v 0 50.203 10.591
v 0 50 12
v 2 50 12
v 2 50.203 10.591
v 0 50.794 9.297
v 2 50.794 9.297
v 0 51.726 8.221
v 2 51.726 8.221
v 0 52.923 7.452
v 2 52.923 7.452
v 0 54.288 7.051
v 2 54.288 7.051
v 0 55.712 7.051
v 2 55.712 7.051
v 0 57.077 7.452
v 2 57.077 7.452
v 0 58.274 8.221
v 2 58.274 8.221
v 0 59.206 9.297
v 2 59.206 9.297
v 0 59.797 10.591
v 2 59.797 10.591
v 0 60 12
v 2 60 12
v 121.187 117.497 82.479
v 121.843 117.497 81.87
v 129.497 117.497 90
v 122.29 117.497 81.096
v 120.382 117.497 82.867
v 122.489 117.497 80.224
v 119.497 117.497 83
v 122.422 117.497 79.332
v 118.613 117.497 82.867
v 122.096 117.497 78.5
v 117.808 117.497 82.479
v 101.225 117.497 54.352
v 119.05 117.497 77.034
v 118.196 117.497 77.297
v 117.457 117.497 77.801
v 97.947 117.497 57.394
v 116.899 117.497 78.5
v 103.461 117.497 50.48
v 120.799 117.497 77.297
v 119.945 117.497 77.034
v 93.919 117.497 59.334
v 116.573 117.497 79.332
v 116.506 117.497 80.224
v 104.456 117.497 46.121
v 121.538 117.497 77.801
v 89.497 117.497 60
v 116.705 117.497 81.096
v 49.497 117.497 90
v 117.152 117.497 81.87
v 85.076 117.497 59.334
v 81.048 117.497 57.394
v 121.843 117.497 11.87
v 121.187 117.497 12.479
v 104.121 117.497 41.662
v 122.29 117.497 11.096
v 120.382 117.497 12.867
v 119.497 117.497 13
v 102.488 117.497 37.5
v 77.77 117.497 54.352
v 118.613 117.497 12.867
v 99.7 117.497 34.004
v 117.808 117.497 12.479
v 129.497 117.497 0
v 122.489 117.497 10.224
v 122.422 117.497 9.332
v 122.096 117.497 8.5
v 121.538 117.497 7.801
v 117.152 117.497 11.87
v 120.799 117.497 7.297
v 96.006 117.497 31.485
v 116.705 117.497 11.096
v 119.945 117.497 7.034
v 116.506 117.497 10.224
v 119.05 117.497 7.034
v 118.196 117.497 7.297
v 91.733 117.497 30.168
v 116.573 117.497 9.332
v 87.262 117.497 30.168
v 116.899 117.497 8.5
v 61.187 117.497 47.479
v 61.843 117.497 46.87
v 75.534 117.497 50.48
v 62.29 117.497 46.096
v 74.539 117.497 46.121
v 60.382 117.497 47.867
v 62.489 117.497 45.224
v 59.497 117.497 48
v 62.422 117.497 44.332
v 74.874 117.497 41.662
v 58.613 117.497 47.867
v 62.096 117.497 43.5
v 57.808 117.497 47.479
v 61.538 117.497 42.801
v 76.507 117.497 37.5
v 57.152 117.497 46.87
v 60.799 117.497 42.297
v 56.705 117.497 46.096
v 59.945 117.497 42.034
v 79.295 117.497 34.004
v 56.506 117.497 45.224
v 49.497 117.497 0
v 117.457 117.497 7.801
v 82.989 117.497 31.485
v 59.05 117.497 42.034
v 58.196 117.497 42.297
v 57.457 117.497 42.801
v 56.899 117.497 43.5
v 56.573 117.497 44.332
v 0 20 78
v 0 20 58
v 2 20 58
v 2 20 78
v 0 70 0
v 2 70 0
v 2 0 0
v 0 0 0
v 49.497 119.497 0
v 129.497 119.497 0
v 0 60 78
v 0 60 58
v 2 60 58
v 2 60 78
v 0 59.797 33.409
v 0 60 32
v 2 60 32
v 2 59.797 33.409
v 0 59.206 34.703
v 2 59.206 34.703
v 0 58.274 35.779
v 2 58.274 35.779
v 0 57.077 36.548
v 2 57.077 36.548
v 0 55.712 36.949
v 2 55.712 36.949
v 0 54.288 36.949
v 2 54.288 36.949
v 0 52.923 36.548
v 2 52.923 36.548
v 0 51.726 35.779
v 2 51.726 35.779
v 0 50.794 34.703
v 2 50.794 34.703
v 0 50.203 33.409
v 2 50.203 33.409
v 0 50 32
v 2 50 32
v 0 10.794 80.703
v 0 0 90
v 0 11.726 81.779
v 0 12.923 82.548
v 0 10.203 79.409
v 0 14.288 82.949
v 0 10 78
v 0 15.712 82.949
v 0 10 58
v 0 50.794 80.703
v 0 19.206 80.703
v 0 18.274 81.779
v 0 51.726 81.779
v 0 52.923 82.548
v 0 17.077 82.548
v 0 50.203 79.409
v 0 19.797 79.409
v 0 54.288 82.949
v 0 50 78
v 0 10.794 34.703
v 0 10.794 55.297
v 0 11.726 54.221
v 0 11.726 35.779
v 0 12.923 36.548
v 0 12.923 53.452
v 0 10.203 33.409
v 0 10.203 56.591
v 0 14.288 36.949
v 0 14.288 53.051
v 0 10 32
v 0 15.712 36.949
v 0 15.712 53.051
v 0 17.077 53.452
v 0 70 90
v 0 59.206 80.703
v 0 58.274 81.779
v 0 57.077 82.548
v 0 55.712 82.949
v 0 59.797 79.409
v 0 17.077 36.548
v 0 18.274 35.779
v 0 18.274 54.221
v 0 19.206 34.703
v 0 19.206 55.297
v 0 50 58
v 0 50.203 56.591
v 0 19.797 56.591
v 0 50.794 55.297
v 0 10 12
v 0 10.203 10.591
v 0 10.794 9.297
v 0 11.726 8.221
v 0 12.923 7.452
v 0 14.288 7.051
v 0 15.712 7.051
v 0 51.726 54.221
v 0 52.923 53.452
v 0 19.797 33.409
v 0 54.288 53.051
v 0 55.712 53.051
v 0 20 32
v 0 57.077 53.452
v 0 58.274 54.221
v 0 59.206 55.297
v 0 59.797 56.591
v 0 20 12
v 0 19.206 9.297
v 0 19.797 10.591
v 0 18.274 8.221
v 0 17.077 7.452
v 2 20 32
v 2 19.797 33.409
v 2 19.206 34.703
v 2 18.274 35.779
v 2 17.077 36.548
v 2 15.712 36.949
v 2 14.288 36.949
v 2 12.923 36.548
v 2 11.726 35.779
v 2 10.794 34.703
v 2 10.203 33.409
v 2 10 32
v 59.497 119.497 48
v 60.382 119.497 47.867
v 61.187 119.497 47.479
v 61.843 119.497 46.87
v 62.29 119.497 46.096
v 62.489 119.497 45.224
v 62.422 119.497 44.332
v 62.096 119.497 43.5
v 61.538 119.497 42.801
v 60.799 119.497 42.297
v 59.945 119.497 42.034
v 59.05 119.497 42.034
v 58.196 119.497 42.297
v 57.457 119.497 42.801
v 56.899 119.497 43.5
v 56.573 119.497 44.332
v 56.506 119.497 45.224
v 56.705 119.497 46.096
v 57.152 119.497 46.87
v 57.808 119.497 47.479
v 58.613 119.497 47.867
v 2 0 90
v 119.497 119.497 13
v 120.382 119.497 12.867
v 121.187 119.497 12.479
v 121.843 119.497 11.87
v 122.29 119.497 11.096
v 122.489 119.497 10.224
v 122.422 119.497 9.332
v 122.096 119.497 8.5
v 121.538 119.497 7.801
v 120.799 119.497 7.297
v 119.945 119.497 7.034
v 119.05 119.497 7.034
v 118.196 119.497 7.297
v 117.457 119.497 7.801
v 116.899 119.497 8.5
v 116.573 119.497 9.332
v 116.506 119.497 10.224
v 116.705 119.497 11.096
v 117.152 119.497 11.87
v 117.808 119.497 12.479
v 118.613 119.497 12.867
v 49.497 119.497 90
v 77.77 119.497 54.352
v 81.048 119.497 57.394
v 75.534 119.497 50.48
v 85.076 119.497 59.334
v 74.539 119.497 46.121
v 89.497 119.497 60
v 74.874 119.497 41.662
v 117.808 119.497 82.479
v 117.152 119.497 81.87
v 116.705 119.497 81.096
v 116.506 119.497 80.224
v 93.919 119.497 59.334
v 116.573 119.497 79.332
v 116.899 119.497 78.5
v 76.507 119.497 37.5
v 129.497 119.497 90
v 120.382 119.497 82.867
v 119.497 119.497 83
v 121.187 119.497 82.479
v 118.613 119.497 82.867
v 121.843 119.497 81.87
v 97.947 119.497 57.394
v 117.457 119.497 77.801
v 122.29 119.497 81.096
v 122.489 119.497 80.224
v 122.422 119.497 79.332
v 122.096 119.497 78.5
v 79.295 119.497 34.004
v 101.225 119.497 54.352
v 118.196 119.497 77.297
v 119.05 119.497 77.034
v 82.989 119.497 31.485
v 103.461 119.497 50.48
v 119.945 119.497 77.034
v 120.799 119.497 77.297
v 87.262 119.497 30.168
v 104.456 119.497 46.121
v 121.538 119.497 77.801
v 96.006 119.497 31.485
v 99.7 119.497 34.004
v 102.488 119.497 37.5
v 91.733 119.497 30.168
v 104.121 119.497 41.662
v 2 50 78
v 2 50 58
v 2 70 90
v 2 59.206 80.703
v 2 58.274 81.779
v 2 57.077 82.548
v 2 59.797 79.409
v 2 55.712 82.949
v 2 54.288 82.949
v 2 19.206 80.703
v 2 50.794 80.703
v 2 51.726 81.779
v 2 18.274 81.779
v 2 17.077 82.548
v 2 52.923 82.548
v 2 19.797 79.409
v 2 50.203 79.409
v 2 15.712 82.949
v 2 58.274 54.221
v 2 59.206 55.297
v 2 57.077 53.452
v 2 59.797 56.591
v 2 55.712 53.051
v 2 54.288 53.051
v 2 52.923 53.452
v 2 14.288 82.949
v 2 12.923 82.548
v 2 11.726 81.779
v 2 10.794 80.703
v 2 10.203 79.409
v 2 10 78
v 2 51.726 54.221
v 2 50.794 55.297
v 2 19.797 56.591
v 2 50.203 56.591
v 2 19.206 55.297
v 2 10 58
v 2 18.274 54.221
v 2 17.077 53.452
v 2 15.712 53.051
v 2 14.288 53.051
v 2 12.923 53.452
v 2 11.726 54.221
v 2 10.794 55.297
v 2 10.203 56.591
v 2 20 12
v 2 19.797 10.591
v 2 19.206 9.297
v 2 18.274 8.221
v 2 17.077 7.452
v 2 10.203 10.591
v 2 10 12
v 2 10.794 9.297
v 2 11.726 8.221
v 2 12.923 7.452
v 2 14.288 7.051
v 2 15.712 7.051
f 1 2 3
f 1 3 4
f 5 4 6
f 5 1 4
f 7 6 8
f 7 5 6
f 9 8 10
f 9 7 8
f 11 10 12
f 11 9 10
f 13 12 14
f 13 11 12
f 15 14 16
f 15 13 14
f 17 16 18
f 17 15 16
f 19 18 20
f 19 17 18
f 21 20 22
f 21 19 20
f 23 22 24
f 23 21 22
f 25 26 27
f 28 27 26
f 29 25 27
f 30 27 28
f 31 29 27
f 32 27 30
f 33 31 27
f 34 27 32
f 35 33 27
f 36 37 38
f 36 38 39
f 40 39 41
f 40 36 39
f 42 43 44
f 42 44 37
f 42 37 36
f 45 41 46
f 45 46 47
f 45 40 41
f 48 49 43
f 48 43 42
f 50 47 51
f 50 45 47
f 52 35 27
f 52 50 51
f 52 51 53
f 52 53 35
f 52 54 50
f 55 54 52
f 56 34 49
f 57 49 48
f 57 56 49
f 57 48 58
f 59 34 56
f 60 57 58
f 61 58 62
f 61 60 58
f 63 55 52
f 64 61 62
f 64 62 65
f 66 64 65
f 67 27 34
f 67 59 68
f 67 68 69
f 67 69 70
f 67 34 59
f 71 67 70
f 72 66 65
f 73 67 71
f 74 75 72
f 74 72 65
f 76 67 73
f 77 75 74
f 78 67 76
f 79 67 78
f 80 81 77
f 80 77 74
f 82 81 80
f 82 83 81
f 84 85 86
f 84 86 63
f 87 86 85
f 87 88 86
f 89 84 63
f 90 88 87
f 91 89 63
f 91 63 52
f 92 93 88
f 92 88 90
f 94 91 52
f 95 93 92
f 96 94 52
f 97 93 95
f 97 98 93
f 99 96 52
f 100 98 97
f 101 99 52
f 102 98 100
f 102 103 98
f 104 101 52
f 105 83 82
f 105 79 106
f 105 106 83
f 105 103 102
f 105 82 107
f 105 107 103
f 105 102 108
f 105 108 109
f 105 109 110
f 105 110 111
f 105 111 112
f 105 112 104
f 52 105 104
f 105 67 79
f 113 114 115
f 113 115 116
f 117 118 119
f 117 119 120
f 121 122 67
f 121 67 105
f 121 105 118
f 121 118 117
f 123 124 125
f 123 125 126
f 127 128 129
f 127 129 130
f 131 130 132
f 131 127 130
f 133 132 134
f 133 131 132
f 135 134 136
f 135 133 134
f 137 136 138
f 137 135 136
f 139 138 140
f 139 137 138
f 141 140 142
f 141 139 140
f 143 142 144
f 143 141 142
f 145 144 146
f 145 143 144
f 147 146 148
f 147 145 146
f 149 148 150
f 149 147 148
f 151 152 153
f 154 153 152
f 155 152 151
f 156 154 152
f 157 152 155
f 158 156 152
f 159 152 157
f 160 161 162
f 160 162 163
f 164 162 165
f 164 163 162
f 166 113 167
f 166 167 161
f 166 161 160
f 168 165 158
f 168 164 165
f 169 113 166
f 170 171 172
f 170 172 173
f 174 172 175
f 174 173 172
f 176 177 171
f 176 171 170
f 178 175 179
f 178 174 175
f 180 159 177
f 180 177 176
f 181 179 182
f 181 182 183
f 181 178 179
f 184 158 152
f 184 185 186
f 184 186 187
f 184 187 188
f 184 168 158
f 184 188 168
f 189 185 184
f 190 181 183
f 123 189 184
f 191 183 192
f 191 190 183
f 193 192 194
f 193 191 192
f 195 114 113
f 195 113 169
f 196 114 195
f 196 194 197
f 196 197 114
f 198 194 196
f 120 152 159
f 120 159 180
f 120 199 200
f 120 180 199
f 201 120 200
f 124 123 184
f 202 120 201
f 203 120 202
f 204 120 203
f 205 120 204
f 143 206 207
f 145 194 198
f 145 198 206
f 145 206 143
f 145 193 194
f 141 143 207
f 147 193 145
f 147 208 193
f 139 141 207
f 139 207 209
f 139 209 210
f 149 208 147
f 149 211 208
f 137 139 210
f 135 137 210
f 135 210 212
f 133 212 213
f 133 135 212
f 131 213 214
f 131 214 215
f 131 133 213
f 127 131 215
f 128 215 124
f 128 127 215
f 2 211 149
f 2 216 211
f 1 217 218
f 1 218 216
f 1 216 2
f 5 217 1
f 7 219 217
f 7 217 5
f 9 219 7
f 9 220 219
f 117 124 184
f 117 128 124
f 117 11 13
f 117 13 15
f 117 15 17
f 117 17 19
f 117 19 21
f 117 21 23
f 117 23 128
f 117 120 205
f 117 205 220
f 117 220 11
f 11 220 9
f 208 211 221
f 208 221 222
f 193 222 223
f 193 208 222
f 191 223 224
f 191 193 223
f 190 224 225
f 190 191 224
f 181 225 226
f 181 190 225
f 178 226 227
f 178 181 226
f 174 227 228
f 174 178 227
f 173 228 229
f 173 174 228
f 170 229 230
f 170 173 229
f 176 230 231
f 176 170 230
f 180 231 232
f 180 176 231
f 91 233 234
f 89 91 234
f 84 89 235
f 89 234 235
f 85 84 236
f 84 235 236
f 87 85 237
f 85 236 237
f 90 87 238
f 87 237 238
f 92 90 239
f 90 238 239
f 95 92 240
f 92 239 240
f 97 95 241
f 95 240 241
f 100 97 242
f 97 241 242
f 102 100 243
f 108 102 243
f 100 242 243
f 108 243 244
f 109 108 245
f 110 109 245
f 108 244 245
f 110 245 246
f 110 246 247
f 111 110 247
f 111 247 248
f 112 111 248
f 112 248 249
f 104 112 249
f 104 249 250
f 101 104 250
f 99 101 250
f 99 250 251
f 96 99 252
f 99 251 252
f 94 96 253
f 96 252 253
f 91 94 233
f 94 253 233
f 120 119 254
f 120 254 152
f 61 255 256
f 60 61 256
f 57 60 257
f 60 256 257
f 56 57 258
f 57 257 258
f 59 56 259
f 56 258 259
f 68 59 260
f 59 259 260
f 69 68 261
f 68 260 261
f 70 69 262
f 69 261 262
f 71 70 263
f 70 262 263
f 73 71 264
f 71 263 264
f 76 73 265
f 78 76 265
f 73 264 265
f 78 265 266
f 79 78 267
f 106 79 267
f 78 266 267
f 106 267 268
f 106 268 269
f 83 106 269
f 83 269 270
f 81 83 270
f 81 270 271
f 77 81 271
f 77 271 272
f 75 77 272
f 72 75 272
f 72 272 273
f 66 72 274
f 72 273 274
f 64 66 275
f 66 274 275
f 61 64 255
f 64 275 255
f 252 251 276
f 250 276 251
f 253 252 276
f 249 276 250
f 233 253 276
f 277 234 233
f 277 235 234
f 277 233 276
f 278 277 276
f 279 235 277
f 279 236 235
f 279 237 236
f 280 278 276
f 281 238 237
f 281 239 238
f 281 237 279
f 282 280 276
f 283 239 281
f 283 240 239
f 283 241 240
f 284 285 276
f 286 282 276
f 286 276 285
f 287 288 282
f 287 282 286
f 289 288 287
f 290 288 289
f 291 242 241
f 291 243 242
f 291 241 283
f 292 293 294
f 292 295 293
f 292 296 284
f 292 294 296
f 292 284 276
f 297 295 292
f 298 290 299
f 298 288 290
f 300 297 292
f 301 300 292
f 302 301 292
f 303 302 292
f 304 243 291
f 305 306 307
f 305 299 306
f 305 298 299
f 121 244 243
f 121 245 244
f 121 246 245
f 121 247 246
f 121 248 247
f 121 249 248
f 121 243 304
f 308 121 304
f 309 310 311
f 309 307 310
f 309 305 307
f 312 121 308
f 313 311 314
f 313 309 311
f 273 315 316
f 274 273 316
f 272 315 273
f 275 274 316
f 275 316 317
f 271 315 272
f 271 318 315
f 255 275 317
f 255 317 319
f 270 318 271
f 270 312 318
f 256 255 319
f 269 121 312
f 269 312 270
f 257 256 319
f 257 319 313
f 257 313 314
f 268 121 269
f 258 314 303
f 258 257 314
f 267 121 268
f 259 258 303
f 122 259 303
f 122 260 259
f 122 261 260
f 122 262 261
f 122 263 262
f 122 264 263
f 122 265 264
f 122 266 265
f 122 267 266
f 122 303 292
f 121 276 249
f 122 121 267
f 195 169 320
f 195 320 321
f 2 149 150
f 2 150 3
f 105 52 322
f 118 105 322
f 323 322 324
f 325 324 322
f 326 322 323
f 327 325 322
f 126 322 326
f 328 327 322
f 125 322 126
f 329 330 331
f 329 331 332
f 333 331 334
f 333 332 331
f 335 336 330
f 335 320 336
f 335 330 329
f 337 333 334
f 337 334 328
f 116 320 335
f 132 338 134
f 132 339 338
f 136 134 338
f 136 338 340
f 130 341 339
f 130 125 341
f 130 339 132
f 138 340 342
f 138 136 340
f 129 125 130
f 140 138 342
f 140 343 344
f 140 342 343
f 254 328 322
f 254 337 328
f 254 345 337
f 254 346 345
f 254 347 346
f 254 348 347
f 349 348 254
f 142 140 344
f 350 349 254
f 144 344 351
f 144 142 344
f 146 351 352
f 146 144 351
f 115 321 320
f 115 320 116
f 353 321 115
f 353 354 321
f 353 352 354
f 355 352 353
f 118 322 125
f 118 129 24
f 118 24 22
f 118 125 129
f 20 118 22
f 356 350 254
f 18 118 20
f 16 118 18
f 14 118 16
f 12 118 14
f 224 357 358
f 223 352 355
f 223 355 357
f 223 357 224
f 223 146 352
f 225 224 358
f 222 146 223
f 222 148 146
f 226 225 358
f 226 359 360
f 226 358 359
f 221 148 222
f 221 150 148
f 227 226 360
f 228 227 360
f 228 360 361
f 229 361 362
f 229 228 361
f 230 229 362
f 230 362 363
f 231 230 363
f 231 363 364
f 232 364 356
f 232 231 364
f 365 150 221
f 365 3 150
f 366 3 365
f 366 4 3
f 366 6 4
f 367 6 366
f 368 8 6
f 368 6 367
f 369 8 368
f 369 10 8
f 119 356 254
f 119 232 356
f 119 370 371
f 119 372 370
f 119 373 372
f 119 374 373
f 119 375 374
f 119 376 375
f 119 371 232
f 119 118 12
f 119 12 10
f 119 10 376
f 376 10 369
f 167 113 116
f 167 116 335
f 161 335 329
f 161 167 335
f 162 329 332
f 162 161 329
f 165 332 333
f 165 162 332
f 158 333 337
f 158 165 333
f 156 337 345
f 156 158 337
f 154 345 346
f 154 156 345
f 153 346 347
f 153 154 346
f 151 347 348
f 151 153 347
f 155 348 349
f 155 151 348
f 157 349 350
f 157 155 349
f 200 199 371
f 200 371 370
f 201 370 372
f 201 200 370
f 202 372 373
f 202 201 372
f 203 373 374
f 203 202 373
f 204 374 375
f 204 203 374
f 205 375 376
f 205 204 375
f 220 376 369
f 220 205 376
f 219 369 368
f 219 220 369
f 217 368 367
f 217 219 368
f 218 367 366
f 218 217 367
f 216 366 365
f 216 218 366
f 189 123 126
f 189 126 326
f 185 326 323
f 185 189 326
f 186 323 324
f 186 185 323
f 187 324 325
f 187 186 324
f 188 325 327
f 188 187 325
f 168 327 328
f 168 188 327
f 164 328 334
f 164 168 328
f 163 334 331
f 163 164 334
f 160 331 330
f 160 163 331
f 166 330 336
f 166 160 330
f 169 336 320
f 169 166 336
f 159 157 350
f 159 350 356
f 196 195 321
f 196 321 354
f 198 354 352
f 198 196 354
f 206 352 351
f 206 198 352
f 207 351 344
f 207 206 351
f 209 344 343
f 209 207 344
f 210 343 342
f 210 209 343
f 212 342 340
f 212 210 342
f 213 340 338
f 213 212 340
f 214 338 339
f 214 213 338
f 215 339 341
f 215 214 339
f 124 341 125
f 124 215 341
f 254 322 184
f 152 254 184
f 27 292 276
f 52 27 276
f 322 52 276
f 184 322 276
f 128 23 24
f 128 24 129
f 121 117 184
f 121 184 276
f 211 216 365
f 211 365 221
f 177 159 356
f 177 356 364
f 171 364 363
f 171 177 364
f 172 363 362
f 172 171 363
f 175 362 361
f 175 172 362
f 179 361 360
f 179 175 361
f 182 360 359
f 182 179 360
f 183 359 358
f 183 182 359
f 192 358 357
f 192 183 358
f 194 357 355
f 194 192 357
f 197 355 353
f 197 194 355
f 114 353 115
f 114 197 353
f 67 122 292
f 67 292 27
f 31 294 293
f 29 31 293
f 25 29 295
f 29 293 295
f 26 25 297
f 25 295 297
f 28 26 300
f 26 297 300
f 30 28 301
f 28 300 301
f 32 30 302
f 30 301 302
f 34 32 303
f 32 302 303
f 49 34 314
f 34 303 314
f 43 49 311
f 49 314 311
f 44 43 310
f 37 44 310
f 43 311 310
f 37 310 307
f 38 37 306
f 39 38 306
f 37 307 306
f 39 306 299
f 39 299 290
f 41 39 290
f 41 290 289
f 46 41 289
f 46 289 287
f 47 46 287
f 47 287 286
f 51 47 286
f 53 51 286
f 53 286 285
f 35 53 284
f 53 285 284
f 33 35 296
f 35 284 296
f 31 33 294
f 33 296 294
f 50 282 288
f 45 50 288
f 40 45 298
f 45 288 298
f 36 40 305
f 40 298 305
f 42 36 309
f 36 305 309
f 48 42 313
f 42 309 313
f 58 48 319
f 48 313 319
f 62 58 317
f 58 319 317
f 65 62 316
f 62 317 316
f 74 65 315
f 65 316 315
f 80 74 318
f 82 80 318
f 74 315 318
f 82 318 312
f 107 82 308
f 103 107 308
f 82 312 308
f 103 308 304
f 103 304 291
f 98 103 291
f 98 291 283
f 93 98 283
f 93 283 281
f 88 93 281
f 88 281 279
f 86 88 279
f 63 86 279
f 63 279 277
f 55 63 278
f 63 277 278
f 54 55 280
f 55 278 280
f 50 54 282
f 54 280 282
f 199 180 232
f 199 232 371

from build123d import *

# Parameters (mm, degrees)
BOSS_EXTRUDE1_DEPTH = 90
SKETCH2_R           = 15
SKETCH2_R_2         = 3
CUT_EXTRUDE1_DEPTH  = 2
CUT_EXTRUDE2_DEPTH  = 2


with BuildPart() as part:
    # Sketch1 → Boss-Extrude1 (new body)
    with BuildSketch(Plane.XY):
        Polygon((0, 0), (0, 70), (49.497474683, 119.497474683), (129.497474683, 119.497474683), (129.497474683, 117.497474683), (49.497474683, 117.497474683), (2, 70), (2, 0), align=None)
    extrude(amount=BOSS_EXTRUDE1_DEPTH)

    # Sketch2 → Cut-Extrude1 (cut)
    with BuildSketch(Plane(origin=(0, 119.497474683, 0), x_dir=(1, 0, 0), z_dir=(0, 1, 0))):
        with Locations(Location((89.497474683, -45, 0), (0, 0, 270))):
            Circle(SKETCH2_R)
        with Locations(Location((59.497474683, -45, 0), (0, 0, 270))):
            Circle(SKETCH2_R_2)
        with Locations(Location((119.497474683, -10, 0), (0, 0, 270))):
            Circle(SKETCH2_R_2)
        with Locations(Location((119.497474683, -80, 0), (0, 0, 270))):
            Circle(SKETCH2_R_2)
    extrude(amount=-CUT_EXTRUDE1_DEPTH, mode=Mode.SUBTRACT)

    # Sketch3 → Cut-Extrude2 (cut)
    with BuildSketch(Plane.ZY):
        with BuildLine():
            Line((12, 60), (32, 60))
            ThreePointArc((32, 60), (37, 55), (32, 50))
            Line((32, 50), (12, 50))
            ThreePointArc((12, 50), (7, 55), (12, 60))
        make_face()
        with BuildLine():
            Line((58, 20), (78, 20))
            ThreePointArc((78, 20), (83, 15), (78, 10))
            Line((78, 10), (58, 10))
            ThreePointArc((58, 10), (53, 15), (58, 20))
        make_face()
        with BuildLine():
            Line((58, 60), (78, 60))
            ThreePointArc((78, 60), (83, 55), (78, 50))
            Line((78, 50), (58, 50))
            ThreePointArc((58, 50), (53, 55), (58, 60))
        make_face()
        with BuildLine():
            Line((12, 20), (32, 20))
            ThreePointArc((32, 20), (37, 15), (32, 10))
            Line((32, 10), (12, 10))
            ThreePointArc((12, 10), (7, 15), (12, 20))
        make_face()
    extrude(amount=-CUT_EXTRUDE2_DEPTH, mode=Mode.SUBTRACT)


solid = part.part
